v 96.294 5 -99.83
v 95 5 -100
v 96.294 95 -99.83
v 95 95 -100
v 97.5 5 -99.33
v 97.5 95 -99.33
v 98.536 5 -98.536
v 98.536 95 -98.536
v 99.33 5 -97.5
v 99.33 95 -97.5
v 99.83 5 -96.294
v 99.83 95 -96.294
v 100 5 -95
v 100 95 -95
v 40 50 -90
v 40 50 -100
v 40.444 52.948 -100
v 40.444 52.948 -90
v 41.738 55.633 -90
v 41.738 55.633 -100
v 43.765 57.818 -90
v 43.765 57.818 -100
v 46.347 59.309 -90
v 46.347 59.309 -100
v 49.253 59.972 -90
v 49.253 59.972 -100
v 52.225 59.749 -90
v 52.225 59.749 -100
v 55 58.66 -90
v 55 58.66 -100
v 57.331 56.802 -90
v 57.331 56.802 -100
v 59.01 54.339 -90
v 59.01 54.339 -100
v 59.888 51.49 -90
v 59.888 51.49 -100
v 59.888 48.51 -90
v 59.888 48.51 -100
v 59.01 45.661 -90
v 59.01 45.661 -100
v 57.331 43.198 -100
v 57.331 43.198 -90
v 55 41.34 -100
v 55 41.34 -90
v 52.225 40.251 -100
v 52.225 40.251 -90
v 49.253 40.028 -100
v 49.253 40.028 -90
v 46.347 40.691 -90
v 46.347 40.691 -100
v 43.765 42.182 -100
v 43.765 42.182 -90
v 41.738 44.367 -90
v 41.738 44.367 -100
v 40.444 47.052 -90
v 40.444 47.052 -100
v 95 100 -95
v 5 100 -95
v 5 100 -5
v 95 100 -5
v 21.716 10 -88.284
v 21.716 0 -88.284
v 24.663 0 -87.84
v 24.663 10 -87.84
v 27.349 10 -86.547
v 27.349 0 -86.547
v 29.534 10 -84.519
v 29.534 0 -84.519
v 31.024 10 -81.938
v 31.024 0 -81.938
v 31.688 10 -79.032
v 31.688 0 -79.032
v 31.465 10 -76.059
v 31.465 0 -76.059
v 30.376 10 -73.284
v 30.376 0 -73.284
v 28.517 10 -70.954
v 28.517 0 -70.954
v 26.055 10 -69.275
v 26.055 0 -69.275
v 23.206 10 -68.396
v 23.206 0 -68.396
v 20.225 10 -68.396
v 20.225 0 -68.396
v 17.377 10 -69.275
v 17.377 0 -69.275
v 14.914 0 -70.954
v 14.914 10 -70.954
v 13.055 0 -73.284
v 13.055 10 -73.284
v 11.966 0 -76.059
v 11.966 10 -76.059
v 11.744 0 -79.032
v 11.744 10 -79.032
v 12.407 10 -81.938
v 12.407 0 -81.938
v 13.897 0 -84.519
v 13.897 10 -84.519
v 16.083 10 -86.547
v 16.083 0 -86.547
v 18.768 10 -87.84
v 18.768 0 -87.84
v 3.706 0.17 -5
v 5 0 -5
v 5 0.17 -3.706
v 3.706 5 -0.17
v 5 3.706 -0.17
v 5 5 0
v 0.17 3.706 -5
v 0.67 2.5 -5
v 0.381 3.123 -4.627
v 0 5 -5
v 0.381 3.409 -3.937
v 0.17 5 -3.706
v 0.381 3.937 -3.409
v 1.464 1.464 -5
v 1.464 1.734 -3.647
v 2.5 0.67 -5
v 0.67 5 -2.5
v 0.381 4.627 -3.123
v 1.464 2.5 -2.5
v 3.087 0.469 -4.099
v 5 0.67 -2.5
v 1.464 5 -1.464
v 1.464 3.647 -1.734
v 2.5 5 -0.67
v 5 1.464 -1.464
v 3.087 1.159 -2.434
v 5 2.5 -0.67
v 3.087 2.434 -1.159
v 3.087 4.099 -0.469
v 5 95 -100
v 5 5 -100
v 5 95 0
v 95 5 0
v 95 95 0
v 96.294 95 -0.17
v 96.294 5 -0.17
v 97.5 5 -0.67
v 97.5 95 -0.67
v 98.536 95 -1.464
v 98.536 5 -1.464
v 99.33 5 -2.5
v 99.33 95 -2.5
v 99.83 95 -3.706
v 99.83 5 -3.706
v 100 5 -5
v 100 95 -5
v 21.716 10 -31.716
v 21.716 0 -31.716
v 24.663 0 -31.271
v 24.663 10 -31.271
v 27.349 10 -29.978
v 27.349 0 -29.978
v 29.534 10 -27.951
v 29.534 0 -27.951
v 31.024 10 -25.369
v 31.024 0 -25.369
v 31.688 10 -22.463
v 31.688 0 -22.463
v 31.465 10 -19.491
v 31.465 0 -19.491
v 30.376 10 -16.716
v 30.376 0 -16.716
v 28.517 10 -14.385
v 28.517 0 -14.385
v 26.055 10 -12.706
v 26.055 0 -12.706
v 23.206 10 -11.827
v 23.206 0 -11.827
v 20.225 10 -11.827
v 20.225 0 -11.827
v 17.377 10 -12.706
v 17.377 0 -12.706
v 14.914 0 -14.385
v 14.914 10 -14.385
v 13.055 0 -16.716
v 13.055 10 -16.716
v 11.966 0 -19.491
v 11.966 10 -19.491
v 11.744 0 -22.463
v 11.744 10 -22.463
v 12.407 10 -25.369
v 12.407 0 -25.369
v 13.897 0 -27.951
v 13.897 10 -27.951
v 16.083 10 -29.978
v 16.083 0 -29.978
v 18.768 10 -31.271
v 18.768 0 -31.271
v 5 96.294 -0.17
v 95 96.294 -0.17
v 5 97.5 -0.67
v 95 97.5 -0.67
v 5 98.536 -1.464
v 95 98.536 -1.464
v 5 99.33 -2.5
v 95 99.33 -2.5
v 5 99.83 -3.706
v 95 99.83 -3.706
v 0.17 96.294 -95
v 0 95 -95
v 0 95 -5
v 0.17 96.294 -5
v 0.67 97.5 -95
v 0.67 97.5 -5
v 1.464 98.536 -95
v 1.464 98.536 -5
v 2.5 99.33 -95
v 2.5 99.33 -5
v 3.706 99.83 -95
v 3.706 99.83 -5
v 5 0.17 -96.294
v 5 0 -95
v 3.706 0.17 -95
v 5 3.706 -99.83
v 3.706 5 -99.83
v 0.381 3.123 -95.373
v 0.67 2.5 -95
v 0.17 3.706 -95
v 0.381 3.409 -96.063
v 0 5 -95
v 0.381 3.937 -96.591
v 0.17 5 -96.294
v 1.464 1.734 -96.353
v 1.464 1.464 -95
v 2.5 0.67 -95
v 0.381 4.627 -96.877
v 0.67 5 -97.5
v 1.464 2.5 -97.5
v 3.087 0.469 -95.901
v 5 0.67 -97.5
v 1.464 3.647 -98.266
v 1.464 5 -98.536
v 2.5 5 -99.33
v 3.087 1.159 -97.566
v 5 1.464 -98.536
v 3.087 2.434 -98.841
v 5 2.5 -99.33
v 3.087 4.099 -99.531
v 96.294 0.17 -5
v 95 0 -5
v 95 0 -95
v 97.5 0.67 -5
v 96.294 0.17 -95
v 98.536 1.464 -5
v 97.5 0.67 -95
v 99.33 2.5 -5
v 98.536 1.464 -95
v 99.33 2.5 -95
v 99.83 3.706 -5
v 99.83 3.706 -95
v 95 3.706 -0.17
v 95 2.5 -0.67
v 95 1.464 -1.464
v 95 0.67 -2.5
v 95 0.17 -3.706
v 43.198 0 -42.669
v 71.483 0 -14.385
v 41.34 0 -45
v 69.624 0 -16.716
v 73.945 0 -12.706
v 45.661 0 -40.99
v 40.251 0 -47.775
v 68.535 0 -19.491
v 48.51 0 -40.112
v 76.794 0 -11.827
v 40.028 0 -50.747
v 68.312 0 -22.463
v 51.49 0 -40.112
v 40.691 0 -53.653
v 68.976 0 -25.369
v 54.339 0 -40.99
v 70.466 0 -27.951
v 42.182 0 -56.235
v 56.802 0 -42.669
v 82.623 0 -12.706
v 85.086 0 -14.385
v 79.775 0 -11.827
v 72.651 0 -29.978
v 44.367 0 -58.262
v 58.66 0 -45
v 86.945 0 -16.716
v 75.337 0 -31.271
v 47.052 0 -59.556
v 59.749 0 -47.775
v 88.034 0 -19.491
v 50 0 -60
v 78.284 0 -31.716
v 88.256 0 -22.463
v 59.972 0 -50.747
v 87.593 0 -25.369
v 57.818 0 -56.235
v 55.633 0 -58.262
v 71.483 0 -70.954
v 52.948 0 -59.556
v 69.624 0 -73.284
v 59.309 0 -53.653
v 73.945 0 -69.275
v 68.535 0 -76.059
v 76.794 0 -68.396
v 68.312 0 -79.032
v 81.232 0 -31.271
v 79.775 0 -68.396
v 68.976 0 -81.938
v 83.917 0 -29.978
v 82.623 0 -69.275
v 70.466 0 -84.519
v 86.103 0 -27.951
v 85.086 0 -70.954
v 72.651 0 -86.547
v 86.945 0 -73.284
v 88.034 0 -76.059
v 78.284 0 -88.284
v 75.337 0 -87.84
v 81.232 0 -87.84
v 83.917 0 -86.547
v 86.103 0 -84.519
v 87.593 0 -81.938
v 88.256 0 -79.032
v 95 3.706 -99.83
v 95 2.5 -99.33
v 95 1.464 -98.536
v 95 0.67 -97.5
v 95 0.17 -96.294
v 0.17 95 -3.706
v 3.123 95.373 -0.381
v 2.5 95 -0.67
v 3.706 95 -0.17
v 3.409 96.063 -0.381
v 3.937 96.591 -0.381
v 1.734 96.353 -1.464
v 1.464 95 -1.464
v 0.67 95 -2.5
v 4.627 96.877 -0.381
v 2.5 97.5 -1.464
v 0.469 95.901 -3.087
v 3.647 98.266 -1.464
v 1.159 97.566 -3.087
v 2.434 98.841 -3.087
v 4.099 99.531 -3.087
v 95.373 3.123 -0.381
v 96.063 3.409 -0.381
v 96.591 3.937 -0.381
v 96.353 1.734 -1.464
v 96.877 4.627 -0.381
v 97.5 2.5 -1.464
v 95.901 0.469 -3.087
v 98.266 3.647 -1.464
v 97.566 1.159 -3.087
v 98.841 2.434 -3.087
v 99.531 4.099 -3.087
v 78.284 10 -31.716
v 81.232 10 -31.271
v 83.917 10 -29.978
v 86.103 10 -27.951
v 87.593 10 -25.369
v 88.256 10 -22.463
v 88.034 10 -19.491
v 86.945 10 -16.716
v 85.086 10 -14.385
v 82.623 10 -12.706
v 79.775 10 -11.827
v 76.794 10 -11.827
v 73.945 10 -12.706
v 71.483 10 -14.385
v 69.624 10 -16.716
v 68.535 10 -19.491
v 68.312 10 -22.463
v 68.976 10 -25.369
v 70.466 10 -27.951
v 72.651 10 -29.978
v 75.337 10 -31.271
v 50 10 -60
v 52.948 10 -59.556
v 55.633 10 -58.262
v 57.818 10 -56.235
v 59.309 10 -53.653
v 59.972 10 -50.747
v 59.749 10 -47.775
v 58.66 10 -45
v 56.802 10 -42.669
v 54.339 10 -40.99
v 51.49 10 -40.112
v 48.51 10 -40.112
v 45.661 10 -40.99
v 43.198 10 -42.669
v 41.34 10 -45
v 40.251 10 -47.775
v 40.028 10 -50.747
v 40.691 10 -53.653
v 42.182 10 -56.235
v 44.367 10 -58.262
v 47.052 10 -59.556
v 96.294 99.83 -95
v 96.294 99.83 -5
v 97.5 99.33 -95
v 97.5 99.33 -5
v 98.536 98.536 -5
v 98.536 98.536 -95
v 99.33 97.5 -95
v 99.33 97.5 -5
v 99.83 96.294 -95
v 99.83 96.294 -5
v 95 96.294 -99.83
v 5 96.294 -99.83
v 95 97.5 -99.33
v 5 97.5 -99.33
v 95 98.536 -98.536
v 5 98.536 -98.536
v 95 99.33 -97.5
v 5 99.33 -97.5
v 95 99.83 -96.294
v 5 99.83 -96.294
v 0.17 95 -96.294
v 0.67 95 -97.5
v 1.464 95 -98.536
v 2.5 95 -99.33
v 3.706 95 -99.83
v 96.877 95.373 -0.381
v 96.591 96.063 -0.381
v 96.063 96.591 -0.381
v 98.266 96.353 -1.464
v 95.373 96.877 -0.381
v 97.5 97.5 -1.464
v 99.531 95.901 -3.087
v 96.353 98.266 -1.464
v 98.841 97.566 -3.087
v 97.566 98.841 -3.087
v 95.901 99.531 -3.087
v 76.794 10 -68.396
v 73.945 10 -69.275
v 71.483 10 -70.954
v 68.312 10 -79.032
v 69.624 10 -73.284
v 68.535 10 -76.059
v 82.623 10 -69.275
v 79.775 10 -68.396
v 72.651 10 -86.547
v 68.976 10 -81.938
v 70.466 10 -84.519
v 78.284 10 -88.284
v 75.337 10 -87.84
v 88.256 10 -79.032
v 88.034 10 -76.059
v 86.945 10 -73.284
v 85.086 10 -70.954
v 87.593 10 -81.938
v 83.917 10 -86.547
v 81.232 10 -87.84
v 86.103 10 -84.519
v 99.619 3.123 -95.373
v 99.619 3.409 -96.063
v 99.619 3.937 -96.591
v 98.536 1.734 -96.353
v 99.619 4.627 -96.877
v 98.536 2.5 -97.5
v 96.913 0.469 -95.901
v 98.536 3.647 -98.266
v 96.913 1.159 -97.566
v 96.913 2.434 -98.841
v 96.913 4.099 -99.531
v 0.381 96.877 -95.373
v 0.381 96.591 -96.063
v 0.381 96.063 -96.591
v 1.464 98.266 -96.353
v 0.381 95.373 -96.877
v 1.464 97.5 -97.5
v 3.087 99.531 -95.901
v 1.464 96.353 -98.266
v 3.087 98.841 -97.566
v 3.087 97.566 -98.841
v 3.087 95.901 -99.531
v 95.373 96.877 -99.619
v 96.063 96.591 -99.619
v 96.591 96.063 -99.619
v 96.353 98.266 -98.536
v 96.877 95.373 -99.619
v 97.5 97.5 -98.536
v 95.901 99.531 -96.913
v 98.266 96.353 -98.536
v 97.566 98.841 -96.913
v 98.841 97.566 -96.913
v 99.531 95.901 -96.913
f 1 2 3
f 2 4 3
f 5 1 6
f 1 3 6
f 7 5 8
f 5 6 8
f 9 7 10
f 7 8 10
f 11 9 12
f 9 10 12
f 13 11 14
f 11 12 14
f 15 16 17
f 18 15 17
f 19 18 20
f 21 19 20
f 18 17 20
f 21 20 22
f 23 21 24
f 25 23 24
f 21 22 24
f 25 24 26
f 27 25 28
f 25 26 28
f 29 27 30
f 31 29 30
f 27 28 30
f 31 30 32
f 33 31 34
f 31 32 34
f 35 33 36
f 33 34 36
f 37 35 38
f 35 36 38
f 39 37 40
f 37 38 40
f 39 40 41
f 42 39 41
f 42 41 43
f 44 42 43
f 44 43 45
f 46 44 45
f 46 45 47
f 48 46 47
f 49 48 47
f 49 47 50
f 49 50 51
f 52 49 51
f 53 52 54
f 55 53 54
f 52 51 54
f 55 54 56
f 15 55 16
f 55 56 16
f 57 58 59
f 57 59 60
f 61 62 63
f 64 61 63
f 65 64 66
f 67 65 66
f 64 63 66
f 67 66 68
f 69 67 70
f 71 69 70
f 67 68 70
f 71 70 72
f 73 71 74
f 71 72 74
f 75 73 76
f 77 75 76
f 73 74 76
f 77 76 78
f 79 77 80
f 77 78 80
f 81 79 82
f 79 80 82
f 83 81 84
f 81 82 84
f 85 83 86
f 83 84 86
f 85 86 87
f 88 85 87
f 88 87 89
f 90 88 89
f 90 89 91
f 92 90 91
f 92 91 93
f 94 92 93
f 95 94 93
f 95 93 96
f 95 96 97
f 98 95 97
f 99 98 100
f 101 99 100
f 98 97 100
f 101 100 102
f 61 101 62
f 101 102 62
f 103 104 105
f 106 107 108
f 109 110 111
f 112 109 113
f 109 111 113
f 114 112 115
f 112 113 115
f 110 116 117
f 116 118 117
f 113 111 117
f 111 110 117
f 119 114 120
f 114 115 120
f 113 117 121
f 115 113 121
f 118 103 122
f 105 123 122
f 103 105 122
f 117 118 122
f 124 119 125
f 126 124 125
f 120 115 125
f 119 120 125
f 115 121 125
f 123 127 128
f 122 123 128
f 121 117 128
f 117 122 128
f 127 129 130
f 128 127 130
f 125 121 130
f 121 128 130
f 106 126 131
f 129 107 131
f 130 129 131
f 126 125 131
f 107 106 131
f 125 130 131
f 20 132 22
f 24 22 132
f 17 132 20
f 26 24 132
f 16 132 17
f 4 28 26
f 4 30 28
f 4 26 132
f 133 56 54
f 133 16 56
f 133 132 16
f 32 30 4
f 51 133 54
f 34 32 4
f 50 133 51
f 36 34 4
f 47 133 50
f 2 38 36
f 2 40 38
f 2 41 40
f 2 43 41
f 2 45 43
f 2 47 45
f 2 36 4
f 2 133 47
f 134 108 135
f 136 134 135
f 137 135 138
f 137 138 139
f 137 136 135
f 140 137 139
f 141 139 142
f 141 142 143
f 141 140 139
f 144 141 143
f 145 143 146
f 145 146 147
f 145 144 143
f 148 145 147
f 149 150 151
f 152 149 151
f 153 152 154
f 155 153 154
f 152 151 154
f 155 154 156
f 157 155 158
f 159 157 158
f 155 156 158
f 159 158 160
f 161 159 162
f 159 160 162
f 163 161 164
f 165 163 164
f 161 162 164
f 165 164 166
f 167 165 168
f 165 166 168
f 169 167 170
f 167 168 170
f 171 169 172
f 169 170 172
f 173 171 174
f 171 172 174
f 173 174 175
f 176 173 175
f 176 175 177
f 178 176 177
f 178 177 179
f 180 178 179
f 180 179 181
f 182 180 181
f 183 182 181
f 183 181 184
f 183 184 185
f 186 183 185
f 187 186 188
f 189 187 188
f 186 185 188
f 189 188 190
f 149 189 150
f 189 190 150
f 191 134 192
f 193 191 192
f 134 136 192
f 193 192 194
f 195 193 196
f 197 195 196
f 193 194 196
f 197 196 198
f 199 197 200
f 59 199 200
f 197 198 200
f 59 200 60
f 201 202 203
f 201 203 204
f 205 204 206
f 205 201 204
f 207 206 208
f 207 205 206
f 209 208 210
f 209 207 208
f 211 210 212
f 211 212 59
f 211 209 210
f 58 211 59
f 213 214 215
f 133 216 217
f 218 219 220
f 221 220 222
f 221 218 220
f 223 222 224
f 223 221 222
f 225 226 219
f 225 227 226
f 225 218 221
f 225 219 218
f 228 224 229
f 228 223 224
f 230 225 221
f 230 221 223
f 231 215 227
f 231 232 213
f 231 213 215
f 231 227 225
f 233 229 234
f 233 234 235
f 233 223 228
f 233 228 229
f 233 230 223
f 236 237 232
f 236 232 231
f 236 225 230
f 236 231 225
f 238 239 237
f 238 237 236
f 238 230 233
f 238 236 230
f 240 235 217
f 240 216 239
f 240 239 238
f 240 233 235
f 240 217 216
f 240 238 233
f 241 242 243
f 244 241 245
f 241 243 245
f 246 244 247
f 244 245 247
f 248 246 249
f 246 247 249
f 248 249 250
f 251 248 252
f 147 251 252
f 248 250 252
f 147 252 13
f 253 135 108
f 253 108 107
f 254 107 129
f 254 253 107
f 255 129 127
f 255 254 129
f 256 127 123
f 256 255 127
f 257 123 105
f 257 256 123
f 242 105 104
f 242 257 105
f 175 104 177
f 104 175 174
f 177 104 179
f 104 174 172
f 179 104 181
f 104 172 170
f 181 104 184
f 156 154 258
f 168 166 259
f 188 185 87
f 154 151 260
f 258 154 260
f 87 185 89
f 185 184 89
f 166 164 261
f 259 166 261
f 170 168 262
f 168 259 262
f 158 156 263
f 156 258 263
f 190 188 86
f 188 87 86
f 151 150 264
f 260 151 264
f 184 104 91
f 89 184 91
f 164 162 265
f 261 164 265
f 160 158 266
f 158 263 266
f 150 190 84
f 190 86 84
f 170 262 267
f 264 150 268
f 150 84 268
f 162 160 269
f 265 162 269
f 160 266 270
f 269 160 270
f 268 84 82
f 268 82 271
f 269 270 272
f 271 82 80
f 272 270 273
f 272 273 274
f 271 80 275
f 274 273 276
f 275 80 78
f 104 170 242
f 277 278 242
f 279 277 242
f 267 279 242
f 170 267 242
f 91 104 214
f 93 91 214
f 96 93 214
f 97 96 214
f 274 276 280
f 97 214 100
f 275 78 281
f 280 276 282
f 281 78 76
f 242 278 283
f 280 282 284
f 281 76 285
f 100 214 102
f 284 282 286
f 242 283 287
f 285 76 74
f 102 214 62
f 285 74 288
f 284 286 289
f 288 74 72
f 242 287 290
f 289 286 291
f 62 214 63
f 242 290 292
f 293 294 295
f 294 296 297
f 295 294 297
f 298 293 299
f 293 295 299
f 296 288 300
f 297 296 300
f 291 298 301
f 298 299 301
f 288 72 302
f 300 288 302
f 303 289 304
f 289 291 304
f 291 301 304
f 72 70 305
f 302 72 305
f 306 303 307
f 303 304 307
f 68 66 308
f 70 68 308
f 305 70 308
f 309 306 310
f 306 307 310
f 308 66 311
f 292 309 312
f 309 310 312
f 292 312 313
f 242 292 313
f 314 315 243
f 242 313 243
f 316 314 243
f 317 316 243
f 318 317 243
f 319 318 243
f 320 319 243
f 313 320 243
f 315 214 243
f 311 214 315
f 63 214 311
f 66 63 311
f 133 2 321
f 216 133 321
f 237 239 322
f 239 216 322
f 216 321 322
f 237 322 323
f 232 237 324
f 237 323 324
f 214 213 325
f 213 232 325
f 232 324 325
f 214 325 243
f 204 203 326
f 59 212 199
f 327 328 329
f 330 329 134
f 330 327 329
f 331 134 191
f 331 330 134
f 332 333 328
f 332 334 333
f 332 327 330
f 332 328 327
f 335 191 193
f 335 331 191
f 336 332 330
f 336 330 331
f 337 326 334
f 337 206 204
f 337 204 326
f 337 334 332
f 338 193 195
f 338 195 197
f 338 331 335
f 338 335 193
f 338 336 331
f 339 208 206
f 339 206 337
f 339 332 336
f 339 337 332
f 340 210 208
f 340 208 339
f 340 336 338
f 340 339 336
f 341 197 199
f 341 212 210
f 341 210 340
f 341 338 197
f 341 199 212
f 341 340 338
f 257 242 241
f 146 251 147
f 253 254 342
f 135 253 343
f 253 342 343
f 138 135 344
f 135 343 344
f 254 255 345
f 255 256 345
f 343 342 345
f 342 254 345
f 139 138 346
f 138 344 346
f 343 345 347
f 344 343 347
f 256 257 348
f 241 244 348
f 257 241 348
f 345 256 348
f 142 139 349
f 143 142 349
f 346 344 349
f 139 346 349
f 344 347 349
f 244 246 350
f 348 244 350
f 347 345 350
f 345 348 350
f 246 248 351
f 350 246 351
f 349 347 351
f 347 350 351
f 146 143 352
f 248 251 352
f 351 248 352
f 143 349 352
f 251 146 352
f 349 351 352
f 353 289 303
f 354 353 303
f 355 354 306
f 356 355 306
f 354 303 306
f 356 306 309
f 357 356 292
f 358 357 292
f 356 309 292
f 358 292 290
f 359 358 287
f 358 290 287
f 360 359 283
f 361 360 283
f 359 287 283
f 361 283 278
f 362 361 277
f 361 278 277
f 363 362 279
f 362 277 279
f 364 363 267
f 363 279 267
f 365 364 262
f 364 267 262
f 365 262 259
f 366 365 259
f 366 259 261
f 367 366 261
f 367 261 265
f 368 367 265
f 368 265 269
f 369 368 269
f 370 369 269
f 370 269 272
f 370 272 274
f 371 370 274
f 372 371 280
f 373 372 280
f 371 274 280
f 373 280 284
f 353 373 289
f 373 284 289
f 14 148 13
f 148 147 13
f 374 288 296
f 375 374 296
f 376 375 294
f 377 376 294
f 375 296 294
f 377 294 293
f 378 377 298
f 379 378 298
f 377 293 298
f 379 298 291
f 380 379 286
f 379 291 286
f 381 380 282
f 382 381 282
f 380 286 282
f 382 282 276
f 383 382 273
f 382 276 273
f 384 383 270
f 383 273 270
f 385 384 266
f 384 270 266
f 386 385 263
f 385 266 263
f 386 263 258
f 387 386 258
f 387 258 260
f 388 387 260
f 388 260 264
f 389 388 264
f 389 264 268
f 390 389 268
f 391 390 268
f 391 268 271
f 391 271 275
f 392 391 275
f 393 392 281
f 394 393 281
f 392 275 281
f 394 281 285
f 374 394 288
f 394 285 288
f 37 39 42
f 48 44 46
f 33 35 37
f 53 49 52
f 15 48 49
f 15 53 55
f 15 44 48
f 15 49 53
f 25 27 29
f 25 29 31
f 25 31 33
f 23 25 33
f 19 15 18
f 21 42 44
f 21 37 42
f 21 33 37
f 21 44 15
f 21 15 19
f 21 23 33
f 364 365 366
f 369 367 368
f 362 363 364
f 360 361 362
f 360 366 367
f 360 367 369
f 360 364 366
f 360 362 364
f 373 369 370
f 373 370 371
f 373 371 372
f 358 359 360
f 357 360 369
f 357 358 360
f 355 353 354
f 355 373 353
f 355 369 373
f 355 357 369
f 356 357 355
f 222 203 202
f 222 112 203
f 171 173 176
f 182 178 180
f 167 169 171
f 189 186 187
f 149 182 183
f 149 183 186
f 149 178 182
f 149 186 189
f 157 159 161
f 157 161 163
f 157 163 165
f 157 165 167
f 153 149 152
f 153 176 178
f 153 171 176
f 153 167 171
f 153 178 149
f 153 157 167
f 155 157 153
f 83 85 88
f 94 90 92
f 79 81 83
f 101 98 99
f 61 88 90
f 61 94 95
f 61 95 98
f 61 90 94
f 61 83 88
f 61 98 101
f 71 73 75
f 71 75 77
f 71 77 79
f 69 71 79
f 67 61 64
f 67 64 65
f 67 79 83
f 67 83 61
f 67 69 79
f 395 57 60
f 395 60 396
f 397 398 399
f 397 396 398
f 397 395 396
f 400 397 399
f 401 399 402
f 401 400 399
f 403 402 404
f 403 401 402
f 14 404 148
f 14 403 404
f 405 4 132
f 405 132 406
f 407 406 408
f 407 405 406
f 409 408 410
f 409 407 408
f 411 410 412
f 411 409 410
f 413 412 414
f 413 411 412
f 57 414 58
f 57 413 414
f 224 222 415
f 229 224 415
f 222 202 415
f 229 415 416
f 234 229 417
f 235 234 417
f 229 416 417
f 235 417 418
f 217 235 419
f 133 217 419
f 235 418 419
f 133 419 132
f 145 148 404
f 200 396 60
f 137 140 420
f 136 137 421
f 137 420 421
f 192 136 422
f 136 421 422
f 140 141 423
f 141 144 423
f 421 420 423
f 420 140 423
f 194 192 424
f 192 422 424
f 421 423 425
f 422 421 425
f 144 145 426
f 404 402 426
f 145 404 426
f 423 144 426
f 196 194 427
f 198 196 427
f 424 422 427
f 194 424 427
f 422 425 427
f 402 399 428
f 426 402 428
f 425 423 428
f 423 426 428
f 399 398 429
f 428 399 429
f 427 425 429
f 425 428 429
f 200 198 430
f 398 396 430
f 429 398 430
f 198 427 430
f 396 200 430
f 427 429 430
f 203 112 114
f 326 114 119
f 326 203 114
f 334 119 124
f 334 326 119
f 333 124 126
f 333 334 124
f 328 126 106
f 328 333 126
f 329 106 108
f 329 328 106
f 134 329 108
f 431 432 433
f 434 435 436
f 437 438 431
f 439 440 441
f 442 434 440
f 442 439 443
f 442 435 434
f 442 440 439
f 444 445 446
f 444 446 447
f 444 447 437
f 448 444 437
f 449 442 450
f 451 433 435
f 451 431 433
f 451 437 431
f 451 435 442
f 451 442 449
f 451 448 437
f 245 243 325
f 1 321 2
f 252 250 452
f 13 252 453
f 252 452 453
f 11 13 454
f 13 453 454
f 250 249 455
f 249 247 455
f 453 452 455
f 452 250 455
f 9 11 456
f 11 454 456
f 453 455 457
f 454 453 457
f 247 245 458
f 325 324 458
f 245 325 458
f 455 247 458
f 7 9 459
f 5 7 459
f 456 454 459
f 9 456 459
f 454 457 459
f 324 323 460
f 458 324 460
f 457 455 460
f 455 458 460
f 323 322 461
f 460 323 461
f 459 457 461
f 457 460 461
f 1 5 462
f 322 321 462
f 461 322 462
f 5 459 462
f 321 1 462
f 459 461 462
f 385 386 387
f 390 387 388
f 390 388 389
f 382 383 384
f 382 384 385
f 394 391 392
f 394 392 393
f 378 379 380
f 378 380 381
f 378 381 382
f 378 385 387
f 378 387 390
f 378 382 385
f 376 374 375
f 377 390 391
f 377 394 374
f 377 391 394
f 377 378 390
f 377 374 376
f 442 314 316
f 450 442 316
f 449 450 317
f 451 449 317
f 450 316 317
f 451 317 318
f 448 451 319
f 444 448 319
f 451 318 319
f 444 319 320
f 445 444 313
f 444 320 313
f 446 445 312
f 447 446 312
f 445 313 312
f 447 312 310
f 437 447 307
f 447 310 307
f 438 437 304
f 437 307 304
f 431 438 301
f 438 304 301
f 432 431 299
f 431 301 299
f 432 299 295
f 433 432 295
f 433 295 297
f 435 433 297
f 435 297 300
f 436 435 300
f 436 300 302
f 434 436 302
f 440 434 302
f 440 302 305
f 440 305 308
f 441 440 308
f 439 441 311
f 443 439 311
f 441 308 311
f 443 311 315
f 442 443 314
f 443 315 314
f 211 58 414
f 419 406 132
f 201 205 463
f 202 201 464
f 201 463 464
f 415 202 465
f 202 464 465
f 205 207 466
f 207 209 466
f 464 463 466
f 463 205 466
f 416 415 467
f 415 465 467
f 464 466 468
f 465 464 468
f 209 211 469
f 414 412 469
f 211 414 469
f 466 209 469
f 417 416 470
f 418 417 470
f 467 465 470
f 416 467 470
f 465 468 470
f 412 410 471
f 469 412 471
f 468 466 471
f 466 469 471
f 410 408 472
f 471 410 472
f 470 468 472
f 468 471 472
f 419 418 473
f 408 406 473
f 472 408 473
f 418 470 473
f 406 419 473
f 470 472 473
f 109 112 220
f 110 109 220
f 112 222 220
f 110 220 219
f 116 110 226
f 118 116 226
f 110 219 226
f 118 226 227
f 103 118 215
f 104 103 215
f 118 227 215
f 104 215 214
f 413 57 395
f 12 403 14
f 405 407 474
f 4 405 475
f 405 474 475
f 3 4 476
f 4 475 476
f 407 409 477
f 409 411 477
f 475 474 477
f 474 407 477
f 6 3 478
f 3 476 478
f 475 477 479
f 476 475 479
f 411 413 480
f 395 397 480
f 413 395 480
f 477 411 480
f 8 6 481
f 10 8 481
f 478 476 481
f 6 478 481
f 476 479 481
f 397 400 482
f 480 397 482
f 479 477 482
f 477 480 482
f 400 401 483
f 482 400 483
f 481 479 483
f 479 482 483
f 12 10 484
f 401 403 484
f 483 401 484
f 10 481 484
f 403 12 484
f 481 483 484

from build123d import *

# Parameters (mm, degrees)
SKETCH1_W           = 100
SKETCH1_H           = 100
BOSS_EXTRUDE1_DEPTH = 100
SKETCH3_R           = 10
CUT_EXTRUDE1_DEPTH  = 10
SKETCH4_R           = 10
CUT_EXTRUDE2_DEPTH  = 10
FILLET5_R           = 5


with BuildPart() as part:
    # Sketch1 → Boss-Extrude1 (new body)
    with BuildSketch(Plane(origin=(0, 0, 0), x_dir=(1, 0, 0), z_dir=(0, 1, 0))):
        with Locations((50, 50)):
            Rectangle(SKETCH1_W, SKETCH1_H)
    extrude(amount=BOSS_EXTRUDE1_DEPTH)

    # Sketch3 → Cut-Extrude1 (cut)
    with BuildSketch(Plane(origin=(0, 0, -100), x_dir=(-1, 0, 0), z_dir=(0, 0, -1))):
        with Locations((-50, 50)):
            Circle(SKETCH3_R)
    extrude(amount=-CUT_EXTRUDE1_DEPTH, mode=Mode.SUBTRACT)

    # Sketch4 → Cut-Extrude2 (cut)
    with BuildSketch(Plane.XZ):
        with Locations(Location((21.715728753, -78.284271247, 0), (0, 0, 270))):
            Circle(SKETCH4_R)
        with Locations(Location((21.715728753, -21.715728753, 0), (0, 0, 270))):
            Circle(SKETCH4_R)
        with Locations(Location((78.284271247, -78.284271247, 0), (0, 0, 270))):
            Circle(SKETCH4_R)
        with Locations(Location((78.284271247, -21.715728753, 0), (0, 0, 270))):
            Circle(SKETCH4_R)
        with Locations(Location((50, -50, 0), (0, 0, 270))):
            Circle(SKETCH4_R)
    extrude(amount=-CUT_EXTRUDE2_DEPTH, mode=Mode.SUBTRACT)

    # Fillet5
    fillet5_edges = [part.edges().sort_by_distance(p)[0] for p in [
        (100, 100, -50),
        (50, 100, -100),
        (0, 100, -50),
        (50, 0, -100),
        (100, 0, -50),
        (50, 0, 0),
        (0, 0, -50),
        (0, 50, -100),
        (100, 50, -100),
        (100, 50, 0),
        (0, 50, 0),
        (50, 100, 0),
    ]]
    fillet(fillet5_edges, radius=FILLET5_R)


solid = part.part
